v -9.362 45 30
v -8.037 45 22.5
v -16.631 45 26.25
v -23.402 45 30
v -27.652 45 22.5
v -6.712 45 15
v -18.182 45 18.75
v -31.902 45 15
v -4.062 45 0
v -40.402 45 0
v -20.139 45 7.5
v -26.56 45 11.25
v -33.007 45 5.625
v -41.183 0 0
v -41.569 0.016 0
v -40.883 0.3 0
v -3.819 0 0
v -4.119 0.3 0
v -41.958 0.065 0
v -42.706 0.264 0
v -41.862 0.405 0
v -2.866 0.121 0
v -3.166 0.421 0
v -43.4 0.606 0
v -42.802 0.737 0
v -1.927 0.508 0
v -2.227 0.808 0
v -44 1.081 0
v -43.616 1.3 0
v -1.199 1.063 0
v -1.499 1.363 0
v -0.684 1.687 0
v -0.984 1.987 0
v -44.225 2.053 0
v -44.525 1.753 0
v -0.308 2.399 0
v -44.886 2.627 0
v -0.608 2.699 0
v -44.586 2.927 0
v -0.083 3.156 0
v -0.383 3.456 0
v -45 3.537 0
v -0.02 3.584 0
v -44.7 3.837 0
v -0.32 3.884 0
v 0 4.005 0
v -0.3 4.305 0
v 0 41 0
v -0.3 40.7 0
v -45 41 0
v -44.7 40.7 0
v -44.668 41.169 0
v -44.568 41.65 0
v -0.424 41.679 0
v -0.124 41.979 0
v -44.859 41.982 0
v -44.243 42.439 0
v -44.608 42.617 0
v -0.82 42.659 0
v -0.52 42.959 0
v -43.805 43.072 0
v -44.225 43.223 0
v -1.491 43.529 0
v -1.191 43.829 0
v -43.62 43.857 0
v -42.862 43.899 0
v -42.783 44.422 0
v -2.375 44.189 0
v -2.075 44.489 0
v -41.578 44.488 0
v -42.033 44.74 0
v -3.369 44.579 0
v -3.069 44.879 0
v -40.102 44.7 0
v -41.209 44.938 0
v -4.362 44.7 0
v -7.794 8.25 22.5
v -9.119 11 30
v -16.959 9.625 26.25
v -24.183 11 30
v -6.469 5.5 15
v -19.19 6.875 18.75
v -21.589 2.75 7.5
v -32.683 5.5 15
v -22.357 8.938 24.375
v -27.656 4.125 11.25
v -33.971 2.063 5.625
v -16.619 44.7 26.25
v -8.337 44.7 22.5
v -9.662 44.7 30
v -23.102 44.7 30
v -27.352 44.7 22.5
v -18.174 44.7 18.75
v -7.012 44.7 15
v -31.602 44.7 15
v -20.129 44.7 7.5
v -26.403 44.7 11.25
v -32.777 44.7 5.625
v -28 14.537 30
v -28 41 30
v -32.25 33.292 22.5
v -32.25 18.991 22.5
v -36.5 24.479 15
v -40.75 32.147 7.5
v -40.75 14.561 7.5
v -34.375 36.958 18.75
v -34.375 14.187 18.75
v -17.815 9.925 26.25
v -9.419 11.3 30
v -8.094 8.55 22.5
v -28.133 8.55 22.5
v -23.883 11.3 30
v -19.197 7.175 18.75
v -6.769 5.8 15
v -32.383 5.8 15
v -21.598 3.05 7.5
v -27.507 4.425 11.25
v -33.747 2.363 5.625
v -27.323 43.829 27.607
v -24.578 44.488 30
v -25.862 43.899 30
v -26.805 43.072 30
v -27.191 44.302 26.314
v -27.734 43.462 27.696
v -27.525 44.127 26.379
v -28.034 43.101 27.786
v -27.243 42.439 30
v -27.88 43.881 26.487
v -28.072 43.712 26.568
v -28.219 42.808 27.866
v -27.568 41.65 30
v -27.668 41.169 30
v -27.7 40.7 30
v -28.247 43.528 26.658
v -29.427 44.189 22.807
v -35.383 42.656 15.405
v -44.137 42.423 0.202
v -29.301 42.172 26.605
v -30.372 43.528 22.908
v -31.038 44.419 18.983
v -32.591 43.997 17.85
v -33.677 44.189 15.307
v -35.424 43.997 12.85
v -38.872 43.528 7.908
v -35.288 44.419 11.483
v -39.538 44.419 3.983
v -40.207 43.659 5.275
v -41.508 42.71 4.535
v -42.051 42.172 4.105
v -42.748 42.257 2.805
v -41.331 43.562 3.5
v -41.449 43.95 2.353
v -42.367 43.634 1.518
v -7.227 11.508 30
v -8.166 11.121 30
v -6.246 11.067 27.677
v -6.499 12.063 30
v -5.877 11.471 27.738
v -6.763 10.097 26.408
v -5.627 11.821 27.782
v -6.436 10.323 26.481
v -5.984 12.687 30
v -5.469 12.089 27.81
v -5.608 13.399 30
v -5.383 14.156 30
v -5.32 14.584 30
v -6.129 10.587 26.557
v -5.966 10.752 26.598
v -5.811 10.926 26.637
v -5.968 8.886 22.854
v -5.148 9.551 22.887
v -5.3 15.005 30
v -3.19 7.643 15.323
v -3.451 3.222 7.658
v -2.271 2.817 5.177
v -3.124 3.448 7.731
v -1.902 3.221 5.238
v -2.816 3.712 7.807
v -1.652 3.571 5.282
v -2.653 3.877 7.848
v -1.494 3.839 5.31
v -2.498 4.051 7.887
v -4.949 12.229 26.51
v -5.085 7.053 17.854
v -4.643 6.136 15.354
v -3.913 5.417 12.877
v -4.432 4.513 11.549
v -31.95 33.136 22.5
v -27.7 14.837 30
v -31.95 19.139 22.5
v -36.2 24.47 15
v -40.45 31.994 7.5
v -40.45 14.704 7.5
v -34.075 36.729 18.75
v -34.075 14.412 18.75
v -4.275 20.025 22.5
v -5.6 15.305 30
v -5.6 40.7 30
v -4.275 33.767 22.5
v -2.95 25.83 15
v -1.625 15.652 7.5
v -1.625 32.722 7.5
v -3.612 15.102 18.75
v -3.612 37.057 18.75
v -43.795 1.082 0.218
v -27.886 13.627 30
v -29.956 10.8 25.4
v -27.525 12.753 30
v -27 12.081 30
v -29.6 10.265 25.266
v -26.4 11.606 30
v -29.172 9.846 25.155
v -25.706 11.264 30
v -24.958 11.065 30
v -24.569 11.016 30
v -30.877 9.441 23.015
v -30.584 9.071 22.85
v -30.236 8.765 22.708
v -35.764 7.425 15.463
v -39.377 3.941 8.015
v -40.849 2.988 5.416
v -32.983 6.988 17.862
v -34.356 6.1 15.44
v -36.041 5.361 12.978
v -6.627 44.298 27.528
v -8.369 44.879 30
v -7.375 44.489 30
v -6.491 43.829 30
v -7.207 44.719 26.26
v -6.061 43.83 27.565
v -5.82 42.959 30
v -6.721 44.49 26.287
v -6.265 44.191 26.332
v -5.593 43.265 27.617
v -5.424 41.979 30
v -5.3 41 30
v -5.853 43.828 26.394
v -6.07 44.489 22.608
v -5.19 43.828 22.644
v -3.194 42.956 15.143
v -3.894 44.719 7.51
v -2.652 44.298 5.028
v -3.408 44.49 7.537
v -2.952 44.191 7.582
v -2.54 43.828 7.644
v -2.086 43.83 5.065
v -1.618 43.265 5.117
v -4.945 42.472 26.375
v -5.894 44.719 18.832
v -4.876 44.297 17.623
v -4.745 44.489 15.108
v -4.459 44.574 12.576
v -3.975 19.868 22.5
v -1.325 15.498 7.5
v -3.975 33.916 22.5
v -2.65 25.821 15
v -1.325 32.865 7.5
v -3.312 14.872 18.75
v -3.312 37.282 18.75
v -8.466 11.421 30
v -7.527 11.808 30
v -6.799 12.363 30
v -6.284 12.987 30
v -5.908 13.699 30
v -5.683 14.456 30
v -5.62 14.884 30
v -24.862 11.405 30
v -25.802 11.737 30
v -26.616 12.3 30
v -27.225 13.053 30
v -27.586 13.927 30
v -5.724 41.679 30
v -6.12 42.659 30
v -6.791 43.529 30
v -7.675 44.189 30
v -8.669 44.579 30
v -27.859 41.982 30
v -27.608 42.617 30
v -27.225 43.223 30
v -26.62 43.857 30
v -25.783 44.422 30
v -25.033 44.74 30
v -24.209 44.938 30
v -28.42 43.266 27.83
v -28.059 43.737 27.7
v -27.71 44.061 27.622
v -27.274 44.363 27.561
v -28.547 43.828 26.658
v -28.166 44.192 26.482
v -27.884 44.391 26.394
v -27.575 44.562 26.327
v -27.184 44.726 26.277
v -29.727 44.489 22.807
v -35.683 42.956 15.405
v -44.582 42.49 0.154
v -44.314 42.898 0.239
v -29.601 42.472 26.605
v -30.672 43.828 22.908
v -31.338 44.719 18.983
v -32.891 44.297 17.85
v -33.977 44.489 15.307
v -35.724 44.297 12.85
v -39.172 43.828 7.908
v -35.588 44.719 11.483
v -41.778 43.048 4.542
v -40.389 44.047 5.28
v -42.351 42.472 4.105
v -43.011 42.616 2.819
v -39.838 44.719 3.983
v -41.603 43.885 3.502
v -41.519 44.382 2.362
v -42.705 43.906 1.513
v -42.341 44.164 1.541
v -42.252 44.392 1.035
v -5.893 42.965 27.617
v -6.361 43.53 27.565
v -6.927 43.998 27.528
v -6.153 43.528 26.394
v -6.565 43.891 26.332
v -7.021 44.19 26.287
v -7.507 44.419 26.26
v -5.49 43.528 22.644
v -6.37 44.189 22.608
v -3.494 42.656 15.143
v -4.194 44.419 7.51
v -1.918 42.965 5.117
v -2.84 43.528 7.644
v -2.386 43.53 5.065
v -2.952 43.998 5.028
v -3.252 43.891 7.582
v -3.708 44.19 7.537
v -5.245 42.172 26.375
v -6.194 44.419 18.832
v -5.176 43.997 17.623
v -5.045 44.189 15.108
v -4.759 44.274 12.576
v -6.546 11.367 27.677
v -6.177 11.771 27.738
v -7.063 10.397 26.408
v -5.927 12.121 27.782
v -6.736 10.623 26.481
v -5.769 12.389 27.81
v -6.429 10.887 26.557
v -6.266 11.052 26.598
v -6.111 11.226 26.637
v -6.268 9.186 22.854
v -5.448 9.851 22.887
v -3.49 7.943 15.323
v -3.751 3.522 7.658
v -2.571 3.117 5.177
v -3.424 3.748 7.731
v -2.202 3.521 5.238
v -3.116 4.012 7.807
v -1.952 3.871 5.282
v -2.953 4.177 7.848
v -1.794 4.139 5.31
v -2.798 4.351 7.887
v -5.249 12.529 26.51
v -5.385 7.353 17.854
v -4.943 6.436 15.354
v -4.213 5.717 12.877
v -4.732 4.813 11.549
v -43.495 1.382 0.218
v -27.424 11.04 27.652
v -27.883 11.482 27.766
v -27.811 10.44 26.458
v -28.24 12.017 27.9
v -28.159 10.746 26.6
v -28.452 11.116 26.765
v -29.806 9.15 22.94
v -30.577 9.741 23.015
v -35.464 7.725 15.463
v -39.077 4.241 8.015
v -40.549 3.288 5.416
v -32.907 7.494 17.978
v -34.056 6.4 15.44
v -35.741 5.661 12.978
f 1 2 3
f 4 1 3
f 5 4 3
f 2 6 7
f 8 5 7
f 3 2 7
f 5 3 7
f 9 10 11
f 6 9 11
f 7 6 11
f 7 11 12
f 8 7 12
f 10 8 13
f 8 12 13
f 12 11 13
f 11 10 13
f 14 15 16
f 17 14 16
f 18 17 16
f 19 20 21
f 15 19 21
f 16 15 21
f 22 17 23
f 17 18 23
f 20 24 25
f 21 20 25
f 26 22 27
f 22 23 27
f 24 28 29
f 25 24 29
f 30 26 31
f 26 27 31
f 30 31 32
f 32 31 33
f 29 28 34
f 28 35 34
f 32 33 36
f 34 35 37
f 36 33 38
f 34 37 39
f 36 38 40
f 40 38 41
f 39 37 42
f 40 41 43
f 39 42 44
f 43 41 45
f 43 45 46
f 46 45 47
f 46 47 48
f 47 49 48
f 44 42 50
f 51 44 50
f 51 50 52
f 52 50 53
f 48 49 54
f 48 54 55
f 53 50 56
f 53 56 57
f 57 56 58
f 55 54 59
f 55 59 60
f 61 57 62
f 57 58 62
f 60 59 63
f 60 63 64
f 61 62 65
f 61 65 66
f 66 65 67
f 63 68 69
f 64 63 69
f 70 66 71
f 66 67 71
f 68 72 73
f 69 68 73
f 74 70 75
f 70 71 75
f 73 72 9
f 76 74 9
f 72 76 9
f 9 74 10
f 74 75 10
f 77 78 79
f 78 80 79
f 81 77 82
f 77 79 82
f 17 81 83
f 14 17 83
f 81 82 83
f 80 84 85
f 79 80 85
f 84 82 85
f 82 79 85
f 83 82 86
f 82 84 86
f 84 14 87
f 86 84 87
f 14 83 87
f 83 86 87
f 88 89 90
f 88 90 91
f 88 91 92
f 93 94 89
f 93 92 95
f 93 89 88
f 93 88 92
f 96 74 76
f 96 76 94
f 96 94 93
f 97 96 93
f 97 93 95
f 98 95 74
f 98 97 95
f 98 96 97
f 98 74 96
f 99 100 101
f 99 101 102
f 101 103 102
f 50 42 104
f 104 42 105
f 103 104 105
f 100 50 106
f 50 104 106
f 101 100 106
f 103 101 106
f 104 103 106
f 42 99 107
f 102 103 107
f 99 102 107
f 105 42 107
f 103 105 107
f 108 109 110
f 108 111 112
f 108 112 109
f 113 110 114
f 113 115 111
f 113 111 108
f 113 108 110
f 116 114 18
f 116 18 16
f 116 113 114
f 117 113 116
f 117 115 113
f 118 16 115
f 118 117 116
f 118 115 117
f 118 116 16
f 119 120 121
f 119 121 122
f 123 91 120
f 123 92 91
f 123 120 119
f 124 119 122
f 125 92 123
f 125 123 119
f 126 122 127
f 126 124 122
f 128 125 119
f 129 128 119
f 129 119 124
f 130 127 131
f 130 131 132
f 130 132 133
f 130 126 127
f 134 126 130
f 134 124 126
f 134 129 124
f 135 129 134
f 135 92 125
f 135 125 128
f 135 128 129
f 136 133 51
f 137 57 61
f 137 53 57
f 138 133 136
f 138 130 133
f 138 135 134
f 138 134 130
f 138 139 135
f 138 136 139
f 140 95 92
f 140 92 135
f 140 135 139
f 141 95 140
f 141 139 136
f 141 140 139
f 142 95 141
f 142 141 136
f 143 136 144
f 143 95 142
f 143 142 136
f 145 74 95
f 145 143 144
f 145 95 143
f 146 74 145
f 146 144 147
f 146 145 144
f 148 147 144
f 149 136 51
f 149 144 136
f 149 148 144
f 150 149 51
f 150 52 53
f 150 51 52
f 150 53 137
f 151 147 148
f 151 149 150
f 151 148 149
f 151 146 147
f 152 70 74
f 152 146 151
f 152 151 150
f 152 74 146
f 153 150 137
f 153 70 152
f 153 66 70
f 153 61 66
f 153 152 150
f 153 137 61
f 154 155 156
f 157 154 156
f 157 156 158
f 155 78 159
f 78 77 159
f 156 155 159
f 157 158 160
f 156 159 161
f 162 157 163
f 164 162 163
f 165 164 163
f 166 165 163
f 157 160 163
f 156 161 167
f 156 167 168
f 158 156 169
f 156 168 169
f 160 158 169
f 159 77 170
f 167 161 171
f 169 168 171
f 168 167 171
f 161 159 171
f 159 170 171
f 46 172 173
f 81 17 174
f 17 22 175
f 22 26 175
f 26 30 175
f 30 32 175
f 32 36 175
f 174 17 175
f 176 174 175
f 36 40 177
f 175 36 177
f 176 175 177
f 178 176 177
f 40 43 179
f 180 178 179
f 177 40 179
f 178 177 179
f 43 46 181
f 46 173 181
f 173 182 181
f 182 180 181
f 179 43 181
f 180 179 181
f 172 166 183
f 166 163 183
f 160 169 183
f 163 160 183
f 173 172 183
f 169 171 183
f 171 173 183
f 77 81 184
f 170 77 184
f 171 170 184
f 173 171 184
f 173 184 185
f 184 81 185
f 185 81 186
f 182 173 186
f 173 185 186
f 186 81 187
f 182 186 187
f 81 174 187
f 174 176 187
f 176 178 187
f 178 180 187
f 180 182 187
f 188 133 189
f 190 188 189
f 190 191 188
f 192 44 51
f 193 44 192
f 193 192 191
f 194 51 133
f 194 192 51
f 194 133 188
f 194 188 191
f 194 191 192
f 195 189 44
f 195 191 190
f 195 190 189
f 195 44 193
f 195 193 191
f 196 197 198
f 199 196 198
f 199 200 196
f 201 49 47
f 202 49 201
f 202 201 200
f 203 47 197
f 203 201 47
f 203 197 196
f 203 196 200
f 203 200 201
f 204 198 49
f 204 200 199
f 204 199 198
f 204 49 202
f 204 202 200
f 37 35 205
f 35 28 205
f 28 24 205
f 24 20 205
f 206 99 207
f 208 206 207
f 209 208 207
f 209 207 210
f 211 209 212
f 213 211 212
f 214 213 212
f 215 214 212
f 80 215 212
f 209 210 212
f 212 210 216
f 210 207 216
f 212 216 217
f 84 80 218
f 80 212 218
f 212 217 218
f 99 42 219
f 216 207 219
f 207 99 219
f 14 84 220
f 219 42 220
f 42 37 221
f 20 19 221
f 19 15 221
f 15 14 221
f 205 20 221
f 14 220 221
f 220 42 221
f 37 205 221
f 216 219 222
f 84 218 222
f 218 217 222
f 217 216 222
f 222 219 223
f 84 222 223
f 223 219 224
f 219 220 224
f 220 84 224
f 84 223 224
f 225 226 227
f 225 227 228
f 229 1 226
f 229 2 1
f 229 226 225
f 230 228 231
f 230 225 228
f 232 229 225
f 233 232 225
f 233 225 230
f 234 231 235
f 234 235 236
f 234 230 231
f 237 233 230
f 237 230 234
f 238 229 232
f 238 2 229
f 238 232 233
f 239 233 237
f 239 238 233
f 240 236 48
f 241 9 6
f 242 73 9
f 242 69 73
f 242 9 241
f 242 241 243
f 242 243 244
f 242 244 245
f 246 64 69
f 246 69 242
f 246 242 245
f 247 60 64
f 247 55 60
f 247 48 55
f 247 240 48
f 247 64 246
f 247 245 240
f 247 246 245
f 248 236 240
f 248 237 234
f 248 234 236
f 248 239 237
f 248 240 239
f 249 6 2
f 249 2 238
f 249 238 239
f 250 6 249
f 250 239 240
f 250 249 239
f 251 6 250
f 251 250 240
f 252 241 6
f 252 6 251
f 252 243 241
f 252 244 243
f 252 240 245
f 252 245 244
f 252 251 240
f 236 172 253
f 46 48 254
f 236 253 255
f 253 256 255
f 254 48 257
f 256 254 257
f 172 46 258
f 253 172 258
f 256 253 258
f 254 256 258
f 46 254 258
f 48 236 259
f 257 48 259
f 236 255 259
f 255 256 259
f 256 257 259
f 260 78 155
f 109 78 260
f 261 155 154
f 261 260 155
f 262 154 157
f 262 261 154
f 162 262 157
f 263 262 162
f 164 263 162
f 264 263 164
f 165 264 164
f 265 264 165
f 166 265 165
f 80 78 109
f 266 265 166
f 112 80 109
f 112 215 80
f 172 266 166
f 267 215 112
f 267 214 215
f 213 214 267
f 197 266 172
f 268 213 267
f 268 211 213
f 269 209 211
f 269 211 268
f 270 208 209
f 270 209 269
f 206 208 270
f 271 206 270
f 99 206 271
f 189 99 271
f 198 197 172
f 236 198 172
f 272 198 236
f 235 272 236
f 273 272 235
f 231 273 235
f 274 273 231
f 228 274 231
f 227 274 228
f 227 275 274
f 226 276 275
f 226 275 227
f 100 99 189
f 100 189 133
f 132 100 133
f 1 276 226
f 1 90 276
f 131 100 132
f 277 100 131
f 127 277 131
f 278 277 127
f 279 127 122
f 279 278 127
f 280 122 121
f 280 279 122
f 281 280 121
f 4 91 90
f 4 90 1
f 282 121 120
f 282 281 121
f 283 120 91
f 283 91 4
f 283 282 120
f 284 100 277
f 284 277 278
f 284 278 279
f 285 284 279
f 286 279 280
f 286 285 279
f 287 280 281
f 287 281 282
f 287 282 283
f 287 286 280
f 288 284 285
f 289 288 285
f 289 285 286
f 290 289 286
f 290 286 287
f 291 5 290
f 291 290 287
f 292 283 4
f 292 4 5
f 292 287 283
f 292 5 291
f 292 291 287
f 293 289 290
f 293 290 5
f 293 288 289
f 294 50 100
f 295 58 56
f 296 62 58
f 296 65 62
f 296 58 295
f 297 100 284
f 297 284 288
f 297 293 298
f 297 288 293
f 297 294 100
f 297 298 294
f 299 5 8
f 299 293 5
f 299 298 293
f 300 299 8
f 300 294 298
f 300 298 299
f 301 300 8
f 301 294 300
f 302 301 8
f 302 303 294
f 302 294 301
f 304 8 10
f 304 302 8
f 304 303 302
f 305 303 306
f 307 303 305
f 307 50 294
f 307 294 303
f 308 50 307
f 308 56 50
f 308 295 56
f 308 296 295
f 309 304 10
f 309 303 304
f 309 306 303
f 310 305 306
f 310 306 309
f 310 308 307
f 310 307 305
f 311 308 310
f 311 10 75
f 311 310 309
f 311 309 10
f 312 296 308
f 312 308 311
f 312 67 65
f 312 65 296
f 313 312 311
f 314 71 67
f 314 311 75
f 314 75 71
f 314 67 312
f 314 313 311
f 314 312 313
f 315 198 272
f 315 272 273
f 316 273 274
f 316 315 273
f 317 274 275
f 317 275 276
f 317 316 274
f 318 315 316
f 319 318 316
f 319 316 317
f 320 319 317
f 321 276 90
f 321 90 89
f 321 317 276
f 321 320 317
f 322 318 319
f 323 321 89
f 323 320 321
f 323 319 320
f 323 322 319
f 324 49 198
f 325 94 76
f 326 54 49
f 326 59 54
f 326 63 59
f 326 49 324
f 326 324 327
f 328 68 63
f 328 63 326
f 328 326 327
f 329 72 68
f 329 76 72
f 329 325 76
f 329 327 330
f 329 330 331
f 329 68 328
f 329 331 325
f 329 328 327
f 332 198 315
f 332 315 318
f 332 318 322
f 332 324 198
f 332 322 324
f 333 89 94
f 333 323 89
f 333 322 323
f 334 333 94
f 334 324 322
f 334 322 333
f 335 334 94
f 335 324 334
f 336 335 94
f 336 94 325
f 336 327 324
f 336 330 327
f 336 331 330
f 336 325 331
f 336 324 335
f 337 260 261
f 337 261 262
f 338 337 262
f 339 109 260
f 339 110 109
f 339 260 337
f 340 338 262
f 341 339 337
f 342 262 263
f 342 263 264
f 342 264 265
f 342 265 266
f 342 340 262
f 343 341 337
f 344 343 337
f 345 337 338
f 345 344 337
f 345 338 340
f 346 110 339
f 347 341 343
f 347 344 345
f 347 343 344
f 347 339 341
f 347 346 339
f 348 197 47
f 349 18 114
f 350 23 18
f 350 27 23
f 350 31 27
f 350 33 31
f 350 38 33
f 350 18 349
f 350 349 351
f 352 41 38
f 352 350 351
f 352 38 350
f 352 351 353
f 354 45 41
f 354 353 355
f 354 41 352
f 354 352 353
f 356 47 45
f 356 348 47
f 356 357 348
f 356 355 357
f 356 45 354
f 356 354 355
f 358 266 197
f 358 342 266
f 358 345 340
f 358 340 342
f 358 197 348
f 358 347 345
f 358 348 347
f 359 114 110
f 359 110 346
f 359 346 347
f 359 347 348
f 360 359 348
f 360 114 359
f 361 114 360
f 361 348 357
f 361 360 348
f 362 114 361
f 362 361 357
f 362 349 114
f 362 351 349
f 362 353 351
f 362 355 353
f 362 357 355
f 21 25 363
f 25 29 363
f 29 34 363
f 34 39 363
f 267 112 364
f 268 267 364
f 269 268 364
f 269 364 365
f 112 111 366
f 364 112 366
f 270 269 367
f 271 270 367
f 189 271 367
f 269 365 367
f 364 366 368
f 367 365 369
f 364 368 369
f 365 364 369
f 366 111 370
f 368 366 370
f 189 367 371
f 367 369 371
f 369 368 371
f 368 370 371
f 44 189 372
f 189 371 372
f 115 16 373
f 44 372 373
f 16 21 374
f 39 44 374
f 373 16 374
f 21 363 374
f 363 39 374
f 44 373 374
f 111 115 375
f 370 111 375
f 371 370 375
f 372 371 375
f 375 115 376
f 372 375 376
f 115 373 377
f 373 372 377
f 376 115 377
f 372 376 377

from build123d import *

# Parameters (mm, degrees)
F2_W = 22.7
F2_H = 34
F0_W = 45
F0_H = 45
F4_W = 22.1
F4_H = 33.4
F5_W = 44.4
F5_H = 44.4
F7_R = 4
F8_R = 4


with BuildPart() as f3:
    # F2 (on offset) → F3 section 0
    with BuildSketch(Plane.XY.offset(30)):
        with Locations((-16.65, 28)):
            Rectangle(F2_W, F2_H)
    # F0 (on Top) → F3 section 1
    with BuildSketch(Plane.XY):
        with Locations((-22.5, 22.5)):
            Rectangle(F0_W, F0_H)
    loft()

    # F4 (on face) → F6 section 0
    with BuildSketch(Plane.XY.offset(30)):
        with Locations((-16.65, 28)):
            Rectangle(F4_W, F4_H)
    # F5 (on face) → F6 section 1
    with BuildSketch(Plane(origin=(0, 0, 0), x_dir=(1, 0, 0), z_dir=(0, 0, -1))):
        with Locations((-22.5, -22.5)):
            Rectangle(F5_W, F5_H)
    loft(mode=Mode.SUBTRACT)

    # F7
    f7_edges = [f3.edges().sort_by_distance(p)[0] for p in [
        (-36.2, 44.7, 15),
        (-36.2, 5.8, 15),
        (-2.95, 5.8, 15),
        (-2.95, 44.7, 15),
    ]]
    fillet(f7_edges, radius=F7_R)

    # F8
    f8_edges = [f3.edges().sort_by_distance(p)[0] for p in [
        (-36.5, 5.5, 15),
        (-36.5, 45, 15),
        (-2.65, 5.5, 15),
        (-2.65, 45, 15),
    ]]
    fillet(f8_edges, radius=F8_R)


solid = f3.part
